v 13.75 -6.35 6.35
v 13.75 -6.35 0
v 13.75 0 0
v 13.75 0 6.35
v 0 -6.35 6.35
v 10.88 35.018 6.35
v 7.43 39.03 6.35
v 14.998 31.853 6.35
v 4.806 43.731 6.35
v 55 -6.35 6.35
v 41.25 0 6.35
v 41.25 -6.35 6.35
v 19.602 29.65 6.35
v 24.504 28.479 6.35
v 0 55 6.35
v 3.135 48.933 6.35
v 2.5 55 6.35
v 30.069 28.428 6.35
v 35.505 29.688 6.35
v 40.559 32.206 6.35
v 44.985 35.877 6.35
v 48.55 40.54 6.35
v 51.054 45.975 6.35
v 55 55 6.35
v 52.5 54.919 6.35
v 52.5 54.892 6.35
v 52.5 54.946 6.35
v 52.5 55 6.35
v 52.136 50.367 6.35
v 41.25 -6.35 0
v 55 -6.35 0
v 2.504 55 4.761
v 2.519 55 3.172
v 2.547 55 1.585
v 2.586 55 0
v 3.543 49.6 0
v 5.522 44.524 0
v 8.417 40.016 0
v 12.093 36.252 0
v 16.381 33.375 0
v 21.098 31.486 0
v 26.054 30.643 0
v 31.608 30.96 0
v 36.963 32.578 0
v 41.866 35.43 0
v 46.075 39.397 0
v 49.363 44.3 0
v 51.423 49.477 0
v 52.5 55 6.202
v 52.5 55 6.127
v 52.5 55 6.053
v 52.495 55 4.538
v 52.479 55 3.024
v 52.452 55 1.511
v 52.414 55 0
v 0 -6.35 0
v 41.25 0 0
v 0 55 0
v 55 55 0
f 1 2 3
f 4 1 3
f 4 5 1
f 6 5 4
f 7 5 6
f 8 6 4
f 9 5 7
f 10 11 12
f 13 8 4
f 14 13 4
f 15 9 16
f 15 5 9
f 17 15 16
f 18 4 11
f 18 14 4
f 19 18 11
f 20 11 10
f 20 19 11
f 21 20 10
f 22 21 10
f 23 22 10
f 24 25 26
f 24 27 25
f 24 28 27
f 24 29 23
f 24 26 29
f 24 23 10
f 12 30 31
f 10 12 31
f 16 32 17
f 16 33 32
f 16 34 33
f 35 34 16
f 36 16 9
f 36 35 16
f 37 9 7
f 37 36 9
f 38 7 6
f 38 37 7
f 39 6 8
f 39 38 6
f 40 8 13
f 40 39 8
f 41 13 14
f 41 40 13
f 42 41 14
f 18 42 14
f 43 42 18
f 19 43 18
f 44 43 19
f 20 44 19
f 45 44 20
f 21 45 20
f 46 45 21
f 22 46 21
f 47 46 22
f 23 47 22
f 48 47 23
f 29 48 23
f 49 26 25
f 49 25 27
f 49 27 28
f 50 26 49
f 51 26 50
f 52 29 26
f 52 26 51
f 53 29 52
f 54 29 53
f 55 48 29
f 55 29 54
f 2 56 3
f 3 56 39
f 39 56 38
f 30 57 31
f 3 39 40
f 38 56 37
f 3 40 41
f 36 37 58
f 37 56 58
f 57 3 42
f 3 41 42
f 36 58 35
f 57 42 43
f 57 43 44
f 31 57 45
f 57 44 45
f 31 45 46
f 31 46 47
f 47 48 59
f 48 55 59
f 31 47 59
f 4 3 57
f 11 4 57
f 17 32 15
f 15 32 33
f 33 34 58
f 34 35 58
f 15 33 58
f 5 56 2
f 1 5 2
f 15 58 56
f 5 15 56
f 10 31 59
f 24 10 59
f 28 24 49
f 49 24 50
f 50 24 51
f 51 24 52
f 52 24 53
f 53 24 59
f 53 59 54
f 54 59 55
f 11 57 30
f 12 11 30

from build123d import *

# Parameters (mm, degrees)
BOSS_EXTRUDE1_DEPTH     = 6.35
CUT_EXTRUDE1_DEPTH      = 77.97632097
CUT_EXTRUDE1_DEPTH_BACK = 77.97632097
SKETCH10_R              = 25.000000038


with BuildPart() as part:
    # Sketch2 → Boss-Extrude1 (new body)
    with BuildSketch(Plane.XY):
        Polygon((13.749999995, 0), (41.249999987, 0), (41.249999987, -6.35), (54.999999982, -6.35), (54.999999982, 0), (54.999999982, 54.999999982), (0, 54.999999982), (0, 0), (0, -6.35), (13.749999995, -6.35), align=None)
    extrude(amount=BOSS_EXTRUDE1_DEPTH)

    # Sketch10 → Cut-Extrude1 (cut, two sides: drawn at the far end of the back side and taken through both)
    with BuildSketch(Plane(origin=(0, 4.380293547, -12.034757611), x_dir=(1, 0, 0), z_dir=(0, -0.3420201433256669, 0.9396926207859092)).offset(-CUT_EXTRUDE1_DEPTH_BACK)):
        with Locations((27.499999991, 53.753435198)):
            Circle(SKETCH10_R)
    extrude(amount=CUT_EXTRUDE1_DEPTH + CUT_EXTRUDE1_DEPTH_BACK, mode=Mode.SUBTRACT)


solid = part.part
